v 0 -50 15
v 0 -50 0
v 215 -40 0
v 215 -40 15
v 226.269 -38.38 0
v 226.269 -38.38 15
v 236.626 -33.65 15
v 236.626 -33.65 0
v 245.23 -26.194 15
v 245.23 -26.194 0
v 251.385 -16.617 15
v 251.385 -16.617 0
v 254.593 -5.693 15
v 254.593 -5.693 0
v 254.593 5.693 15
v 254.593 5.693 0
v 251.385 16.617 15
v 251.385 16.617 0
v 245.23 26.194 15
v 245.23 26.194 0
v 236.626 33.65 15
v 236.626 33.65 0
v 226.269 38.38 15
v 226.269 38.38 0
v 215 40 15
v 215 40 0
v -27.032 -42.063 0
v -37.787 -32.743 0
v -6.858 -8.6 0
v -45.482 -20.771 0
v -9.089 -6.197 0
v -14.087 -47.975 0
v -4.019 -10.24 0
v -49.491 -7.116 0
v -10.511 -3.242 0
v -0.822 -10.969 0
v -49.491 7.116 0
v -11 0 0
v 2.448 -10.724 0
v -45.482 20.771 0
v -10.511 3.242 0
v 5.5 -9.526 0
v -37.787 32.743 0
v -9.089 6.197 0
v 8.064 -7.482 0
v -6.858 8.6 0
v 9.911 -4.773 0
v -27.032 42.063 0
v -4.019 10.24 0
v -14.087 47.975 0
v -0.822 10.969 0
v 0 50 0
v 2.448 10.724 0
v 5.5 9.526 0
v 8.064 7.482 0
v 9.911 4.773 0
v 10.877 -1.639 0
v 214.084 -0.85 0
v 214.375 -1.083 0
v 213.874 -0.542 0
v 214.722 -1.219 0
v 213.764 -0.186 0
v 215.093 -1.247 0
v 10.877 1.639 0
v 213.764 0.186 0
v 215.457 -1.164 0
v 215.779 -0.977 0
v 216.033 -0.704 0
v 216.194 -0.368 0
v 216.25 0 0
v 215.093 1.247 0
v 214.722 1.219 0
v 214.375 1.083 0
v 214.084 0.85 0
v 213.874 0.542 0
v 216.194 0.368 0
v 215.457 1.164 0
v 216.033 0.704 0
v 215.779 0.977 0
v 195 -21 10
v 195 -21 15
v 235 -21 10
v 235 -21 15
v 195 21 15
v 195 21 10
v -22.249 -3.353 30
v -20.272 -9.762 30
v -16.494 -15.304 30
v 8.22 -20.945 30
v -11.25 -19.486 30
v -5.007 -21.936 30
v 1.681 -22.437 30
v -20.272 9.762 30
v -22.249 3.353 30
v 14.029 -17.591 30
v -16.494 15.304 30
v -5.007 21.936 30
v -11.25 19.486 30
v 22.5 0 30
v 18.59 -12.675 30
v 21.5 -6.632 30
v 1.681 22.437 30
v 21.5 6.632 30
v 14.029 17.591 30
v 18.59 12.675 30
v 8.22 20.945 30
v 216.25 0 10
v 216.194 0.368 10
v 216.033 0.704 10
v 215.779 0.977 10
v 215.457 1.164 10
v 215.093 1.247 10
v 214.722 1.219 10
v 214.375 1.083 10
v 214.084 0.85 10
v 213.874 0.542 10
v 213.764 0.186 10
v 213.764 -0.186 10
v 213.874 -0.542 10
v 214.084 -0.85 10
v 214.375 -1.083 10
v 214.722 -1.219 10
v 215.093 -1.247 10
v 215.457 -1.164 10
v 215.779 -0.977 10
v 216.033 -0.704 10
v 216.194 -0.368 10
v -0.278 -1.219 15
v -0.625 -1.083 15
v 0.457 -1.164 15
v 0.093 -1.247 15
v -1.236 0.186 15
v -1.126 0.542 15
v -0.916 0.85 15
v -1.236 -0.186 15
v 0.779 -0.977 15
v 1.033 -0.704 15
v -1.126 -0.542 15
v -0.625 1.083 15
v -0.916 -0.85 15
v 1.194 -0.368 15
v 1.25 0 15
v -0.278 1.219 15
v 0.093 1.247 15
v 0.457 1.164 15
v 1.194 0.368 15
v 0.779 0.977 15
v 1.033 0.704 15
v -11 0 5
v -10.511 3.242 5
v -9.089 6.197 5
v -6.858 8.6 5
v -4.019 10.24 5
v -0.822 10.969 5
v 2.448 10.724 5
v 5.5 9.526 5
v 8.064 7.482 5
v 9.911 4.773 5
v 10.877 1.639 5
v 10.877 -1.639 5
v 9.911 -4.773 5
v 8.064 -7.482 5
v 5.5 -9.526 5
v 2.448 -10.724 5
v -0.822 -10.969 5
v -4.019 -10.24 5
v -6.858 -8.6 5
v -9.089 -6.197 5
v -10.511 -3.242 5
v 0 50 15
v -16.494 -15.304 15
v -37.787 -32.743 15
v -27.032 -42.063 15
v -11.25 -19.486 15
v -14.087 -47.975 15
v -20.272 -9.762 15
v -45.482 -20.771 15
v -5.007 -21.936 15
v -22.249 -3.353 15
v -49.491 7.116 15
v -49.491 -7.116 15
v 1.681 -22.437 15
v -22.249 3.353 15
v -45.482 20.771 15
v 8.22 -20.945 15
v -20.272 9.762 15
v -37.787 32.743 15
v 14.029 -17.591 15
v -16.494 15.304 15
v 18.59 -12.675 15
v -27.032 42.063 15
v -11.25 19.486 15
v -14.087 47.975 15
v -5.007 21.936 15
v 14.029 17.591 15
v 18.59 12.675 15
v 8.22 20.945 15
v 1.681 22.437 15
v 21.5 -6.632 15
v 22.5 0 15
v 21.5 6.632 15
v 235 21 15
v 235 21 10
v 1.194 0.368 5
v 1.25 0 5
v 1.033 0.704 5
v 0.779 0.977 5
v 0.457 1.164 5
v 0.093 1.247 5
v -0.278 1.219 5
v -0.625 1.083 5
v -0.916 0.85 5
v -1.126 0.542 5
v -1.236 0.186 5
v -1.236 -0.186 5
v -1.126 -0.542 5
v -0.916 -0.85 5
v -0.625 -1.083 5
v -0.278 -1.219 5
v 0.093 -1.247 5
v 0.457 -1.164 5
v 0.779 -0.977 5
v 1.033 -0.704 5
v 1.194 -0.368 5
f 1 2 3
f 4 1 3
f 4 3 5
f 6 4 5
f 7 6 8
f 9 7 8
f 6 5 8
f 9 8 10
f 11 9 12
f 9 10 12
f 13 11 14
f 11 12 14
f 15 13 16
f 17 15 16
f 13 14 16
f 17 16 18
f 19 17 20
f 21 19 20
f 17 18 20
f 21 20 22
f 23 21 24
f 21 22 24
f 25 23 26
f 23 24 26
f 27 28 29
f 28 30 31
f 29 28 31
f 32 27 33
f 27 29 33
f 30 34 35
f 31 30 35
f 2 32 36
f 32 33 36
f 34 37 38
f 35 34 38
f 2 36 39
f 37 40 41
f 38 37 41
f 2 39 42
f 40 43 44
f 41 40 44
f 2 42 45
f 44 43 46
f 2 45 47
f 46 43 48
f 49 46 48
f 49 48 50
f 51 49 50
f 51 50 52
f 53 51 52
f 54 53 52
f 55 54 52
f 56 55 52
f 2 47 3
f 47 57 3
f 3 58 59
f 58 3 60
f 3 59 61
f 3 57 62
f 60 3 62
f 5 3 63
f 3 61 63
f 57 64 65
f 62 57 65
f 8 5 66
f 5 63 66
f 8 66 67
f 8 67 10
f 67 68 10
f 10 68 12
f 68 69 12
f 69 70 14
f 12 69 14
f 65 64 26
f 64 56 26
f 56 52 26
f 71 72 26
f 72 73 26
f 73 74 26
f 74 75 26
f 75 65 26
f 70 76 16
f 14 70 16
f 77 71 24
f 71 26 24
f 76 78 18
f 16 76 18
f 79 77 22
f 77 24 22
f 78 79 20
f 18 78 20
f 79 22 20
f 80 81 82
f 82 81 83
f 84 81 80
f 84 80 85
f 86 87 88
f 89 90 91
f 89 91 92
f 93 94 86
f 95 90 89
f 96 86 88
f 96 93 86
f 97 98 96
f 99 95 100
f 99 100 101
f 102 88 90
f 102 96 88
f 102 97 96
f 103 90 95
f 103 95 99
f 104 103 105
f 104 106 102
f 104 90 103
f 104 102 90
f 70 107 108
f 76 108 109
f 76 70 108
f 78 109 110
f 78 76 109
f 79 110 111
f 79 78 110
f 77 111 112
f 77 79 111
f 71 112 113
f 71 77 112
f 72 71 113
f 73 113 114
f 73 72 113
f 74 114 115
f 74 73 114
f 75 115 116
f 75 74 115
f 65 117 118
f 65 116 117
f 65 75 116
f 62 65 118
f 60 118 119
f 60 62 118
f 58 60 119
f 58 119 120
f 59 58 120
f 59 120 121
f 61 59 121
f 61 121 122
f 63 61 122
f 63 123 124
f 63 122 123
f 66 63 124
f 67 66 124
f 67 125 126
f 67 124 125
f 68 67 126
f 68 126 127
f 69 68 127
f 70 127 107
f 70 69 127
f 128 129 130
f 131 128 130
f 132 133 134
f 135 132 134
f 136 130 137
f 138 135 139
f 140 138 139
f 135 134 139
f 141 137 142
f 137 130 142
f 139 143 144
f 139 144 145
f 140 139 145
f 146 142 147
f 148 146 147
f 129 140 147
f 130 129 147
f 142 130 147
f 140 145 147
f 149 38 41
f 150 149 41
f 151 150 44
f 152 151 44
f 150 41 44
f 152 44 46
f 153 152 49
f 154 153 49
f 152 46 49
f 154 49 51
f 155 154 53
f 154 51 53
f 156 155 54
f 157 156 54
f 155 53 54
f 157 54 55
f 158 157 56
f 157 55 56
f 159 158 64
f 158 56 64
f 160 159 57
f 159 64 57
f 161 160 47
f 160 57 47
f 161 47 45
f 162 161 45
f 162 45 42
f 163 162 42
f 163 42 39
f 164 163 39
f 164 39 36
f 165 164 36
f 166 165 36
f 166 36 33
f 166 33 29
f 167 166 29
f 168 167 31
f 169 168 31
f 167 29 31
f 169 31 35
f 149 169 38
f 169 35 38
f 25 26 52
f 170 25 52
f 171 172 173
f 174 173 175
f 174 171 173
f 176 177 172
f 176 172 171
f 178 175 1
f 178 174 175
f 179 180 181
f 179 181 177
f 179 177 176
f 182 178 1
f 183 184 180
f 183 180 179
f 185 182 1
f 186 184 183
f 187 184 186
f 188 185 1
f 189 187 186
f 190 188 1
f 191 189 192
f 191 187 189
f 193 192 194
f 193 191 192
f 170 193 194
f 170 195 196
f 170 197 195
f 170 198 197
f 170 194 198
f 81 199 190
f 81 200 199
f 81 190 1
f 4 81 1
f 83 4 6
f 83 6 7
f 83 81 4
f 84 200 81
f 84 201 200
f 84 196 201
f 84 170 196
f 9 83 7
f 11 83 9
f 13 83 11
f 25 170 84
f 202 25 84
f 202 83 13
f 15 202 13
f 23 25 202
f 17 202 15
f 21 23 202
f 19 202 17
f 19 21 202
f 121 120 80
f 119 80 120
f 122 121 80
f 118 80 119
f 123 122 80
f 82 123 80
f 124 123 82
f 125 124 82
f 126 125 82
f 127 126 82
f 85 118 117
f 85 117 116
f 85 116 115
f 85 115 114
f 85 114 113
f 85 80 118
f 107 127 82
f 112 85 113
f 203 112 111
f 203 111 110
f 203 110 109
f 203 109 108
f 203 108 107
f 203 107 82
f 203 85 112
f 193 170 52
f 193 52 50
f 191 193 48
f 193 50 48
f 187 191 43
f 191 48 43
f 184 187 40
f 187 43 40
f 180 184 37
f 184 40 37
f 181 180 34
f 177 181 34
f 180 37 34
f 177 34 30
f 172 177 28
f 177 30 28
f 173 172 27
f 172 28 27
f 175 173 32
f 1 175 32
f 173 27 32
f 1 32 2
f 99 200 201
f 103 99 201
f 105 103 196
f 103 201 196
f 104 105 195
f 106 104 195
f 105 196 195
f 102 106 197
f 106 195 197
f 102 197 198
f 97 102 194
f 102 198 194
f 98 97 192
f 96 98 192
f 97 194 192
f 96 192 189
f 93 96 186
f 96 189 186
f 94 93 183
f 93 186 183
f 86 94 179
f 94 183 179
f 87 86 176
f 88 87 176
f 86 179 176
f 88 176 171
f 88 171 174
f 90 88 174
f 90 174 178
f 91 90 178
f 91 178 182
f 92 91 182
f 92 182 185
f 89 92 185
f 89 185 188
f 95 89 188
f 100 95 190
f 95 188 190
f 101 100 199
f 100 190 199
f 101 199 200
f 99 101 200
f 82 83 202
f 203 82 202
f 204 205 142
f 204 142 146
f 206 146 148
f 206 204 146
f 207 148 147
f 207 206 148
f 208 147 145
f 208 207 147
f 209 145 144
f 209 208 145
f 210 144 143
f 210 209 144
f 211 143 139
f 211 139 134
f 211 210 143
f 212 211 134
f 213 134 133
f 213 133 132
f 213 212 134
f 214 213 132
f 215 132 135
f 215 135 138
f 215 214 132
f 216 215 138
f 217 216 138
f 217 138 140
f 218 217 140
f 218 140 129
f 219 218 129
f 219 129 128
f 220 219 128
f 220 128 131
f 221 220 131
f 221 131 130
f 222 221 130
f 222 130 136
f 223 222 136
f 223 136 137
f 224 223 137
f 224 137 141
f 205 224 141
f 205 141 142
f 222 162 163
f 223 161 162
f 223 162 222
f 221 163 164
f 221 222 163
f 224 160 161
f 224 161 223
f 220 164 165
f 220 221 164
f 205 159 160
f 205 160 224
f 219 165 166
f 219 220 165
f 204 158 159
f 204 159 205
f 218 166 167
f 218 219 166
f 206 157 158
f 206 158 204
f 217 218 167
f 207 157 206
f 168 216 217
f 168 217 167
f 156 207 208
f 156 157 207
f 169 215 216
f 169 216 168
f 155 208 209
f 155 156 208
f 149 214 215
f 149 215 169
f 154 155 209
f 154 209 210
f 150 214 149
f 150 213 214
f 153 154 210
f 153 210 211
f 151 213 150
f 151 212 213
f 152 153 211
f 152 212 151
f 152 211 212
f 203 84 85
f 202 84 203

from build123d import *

# Parameters (mm, degrees)
CROQUIS1_R              = 1.25
SALIENTE_EXTRUIR1_DEPTH = 15
CROQUIS4_R              = 22.5
SALIENTE_EXTRUIR2_DEPTH = 15
CROQUIS5_R              = 11
CORTAR_EXTRUIR1_DEPTH   = 5
CROQUIS6_W              = 40
CROQUIS6_H              = 42
CORTAR_EXTRUIR2_DEPTH   = 5


with BuildPart() as part:
    # Croquis1 → Saliente-Extruir1 (new body)
    with BuildSketch(Plane.XY):
        with BuildLine():
            Line((0, -50), (215, -40))
            ThreePointArc((215, -40), (255, 0), (215, 40))
            Line((215, 40), (0, 50))
            ThreePointArc((0, 50), (-50, 0), (0, -50))
        make_face()
        Circle(CROQUIS1_R, mode=Mode.SUBTRACT)
        with Locations((215, 0)):
            Circle(CROQUIS1_R, mode=Mode.SUBTRACT)
    extrude(amount=SALIENTE_EXTRUIR1_DEPTH)

    # Croquis4 → Saliente-Extruir2 (add)
    with BuildSketch(Plane.XY.offset(15)):
        Circle(CROQUIS4_R)
    extrude(amount=SALIENTE_EXTRUIR2_DEPTH)

    # Croquis5 → Cortar-Extruir1 (cut)
    with BuildSketch(Plane(origin=(0, 0, 0), x_dir=(-1, 0, 0), z_dir=(0, 0, -1))):
        Circle(CROQUIS5_R)
    extrude(amount=-CORTAR_EXTRUIR1_DEPTH, mode=Mode.SUBTRACT)

    # Croquis6 → Cortar-Extruir2 (cut)
    with BuildSketch(Plane.XY.offset(15)):
        with Locations((215, 0)):
            Rectangle(CROQUIS6_W, CROQUIS6_H)
    extrude(amount=-CORTAR_EXTRUIR2_DEPTH, mode=Mode.SUBTRACT)


solid = part.part
